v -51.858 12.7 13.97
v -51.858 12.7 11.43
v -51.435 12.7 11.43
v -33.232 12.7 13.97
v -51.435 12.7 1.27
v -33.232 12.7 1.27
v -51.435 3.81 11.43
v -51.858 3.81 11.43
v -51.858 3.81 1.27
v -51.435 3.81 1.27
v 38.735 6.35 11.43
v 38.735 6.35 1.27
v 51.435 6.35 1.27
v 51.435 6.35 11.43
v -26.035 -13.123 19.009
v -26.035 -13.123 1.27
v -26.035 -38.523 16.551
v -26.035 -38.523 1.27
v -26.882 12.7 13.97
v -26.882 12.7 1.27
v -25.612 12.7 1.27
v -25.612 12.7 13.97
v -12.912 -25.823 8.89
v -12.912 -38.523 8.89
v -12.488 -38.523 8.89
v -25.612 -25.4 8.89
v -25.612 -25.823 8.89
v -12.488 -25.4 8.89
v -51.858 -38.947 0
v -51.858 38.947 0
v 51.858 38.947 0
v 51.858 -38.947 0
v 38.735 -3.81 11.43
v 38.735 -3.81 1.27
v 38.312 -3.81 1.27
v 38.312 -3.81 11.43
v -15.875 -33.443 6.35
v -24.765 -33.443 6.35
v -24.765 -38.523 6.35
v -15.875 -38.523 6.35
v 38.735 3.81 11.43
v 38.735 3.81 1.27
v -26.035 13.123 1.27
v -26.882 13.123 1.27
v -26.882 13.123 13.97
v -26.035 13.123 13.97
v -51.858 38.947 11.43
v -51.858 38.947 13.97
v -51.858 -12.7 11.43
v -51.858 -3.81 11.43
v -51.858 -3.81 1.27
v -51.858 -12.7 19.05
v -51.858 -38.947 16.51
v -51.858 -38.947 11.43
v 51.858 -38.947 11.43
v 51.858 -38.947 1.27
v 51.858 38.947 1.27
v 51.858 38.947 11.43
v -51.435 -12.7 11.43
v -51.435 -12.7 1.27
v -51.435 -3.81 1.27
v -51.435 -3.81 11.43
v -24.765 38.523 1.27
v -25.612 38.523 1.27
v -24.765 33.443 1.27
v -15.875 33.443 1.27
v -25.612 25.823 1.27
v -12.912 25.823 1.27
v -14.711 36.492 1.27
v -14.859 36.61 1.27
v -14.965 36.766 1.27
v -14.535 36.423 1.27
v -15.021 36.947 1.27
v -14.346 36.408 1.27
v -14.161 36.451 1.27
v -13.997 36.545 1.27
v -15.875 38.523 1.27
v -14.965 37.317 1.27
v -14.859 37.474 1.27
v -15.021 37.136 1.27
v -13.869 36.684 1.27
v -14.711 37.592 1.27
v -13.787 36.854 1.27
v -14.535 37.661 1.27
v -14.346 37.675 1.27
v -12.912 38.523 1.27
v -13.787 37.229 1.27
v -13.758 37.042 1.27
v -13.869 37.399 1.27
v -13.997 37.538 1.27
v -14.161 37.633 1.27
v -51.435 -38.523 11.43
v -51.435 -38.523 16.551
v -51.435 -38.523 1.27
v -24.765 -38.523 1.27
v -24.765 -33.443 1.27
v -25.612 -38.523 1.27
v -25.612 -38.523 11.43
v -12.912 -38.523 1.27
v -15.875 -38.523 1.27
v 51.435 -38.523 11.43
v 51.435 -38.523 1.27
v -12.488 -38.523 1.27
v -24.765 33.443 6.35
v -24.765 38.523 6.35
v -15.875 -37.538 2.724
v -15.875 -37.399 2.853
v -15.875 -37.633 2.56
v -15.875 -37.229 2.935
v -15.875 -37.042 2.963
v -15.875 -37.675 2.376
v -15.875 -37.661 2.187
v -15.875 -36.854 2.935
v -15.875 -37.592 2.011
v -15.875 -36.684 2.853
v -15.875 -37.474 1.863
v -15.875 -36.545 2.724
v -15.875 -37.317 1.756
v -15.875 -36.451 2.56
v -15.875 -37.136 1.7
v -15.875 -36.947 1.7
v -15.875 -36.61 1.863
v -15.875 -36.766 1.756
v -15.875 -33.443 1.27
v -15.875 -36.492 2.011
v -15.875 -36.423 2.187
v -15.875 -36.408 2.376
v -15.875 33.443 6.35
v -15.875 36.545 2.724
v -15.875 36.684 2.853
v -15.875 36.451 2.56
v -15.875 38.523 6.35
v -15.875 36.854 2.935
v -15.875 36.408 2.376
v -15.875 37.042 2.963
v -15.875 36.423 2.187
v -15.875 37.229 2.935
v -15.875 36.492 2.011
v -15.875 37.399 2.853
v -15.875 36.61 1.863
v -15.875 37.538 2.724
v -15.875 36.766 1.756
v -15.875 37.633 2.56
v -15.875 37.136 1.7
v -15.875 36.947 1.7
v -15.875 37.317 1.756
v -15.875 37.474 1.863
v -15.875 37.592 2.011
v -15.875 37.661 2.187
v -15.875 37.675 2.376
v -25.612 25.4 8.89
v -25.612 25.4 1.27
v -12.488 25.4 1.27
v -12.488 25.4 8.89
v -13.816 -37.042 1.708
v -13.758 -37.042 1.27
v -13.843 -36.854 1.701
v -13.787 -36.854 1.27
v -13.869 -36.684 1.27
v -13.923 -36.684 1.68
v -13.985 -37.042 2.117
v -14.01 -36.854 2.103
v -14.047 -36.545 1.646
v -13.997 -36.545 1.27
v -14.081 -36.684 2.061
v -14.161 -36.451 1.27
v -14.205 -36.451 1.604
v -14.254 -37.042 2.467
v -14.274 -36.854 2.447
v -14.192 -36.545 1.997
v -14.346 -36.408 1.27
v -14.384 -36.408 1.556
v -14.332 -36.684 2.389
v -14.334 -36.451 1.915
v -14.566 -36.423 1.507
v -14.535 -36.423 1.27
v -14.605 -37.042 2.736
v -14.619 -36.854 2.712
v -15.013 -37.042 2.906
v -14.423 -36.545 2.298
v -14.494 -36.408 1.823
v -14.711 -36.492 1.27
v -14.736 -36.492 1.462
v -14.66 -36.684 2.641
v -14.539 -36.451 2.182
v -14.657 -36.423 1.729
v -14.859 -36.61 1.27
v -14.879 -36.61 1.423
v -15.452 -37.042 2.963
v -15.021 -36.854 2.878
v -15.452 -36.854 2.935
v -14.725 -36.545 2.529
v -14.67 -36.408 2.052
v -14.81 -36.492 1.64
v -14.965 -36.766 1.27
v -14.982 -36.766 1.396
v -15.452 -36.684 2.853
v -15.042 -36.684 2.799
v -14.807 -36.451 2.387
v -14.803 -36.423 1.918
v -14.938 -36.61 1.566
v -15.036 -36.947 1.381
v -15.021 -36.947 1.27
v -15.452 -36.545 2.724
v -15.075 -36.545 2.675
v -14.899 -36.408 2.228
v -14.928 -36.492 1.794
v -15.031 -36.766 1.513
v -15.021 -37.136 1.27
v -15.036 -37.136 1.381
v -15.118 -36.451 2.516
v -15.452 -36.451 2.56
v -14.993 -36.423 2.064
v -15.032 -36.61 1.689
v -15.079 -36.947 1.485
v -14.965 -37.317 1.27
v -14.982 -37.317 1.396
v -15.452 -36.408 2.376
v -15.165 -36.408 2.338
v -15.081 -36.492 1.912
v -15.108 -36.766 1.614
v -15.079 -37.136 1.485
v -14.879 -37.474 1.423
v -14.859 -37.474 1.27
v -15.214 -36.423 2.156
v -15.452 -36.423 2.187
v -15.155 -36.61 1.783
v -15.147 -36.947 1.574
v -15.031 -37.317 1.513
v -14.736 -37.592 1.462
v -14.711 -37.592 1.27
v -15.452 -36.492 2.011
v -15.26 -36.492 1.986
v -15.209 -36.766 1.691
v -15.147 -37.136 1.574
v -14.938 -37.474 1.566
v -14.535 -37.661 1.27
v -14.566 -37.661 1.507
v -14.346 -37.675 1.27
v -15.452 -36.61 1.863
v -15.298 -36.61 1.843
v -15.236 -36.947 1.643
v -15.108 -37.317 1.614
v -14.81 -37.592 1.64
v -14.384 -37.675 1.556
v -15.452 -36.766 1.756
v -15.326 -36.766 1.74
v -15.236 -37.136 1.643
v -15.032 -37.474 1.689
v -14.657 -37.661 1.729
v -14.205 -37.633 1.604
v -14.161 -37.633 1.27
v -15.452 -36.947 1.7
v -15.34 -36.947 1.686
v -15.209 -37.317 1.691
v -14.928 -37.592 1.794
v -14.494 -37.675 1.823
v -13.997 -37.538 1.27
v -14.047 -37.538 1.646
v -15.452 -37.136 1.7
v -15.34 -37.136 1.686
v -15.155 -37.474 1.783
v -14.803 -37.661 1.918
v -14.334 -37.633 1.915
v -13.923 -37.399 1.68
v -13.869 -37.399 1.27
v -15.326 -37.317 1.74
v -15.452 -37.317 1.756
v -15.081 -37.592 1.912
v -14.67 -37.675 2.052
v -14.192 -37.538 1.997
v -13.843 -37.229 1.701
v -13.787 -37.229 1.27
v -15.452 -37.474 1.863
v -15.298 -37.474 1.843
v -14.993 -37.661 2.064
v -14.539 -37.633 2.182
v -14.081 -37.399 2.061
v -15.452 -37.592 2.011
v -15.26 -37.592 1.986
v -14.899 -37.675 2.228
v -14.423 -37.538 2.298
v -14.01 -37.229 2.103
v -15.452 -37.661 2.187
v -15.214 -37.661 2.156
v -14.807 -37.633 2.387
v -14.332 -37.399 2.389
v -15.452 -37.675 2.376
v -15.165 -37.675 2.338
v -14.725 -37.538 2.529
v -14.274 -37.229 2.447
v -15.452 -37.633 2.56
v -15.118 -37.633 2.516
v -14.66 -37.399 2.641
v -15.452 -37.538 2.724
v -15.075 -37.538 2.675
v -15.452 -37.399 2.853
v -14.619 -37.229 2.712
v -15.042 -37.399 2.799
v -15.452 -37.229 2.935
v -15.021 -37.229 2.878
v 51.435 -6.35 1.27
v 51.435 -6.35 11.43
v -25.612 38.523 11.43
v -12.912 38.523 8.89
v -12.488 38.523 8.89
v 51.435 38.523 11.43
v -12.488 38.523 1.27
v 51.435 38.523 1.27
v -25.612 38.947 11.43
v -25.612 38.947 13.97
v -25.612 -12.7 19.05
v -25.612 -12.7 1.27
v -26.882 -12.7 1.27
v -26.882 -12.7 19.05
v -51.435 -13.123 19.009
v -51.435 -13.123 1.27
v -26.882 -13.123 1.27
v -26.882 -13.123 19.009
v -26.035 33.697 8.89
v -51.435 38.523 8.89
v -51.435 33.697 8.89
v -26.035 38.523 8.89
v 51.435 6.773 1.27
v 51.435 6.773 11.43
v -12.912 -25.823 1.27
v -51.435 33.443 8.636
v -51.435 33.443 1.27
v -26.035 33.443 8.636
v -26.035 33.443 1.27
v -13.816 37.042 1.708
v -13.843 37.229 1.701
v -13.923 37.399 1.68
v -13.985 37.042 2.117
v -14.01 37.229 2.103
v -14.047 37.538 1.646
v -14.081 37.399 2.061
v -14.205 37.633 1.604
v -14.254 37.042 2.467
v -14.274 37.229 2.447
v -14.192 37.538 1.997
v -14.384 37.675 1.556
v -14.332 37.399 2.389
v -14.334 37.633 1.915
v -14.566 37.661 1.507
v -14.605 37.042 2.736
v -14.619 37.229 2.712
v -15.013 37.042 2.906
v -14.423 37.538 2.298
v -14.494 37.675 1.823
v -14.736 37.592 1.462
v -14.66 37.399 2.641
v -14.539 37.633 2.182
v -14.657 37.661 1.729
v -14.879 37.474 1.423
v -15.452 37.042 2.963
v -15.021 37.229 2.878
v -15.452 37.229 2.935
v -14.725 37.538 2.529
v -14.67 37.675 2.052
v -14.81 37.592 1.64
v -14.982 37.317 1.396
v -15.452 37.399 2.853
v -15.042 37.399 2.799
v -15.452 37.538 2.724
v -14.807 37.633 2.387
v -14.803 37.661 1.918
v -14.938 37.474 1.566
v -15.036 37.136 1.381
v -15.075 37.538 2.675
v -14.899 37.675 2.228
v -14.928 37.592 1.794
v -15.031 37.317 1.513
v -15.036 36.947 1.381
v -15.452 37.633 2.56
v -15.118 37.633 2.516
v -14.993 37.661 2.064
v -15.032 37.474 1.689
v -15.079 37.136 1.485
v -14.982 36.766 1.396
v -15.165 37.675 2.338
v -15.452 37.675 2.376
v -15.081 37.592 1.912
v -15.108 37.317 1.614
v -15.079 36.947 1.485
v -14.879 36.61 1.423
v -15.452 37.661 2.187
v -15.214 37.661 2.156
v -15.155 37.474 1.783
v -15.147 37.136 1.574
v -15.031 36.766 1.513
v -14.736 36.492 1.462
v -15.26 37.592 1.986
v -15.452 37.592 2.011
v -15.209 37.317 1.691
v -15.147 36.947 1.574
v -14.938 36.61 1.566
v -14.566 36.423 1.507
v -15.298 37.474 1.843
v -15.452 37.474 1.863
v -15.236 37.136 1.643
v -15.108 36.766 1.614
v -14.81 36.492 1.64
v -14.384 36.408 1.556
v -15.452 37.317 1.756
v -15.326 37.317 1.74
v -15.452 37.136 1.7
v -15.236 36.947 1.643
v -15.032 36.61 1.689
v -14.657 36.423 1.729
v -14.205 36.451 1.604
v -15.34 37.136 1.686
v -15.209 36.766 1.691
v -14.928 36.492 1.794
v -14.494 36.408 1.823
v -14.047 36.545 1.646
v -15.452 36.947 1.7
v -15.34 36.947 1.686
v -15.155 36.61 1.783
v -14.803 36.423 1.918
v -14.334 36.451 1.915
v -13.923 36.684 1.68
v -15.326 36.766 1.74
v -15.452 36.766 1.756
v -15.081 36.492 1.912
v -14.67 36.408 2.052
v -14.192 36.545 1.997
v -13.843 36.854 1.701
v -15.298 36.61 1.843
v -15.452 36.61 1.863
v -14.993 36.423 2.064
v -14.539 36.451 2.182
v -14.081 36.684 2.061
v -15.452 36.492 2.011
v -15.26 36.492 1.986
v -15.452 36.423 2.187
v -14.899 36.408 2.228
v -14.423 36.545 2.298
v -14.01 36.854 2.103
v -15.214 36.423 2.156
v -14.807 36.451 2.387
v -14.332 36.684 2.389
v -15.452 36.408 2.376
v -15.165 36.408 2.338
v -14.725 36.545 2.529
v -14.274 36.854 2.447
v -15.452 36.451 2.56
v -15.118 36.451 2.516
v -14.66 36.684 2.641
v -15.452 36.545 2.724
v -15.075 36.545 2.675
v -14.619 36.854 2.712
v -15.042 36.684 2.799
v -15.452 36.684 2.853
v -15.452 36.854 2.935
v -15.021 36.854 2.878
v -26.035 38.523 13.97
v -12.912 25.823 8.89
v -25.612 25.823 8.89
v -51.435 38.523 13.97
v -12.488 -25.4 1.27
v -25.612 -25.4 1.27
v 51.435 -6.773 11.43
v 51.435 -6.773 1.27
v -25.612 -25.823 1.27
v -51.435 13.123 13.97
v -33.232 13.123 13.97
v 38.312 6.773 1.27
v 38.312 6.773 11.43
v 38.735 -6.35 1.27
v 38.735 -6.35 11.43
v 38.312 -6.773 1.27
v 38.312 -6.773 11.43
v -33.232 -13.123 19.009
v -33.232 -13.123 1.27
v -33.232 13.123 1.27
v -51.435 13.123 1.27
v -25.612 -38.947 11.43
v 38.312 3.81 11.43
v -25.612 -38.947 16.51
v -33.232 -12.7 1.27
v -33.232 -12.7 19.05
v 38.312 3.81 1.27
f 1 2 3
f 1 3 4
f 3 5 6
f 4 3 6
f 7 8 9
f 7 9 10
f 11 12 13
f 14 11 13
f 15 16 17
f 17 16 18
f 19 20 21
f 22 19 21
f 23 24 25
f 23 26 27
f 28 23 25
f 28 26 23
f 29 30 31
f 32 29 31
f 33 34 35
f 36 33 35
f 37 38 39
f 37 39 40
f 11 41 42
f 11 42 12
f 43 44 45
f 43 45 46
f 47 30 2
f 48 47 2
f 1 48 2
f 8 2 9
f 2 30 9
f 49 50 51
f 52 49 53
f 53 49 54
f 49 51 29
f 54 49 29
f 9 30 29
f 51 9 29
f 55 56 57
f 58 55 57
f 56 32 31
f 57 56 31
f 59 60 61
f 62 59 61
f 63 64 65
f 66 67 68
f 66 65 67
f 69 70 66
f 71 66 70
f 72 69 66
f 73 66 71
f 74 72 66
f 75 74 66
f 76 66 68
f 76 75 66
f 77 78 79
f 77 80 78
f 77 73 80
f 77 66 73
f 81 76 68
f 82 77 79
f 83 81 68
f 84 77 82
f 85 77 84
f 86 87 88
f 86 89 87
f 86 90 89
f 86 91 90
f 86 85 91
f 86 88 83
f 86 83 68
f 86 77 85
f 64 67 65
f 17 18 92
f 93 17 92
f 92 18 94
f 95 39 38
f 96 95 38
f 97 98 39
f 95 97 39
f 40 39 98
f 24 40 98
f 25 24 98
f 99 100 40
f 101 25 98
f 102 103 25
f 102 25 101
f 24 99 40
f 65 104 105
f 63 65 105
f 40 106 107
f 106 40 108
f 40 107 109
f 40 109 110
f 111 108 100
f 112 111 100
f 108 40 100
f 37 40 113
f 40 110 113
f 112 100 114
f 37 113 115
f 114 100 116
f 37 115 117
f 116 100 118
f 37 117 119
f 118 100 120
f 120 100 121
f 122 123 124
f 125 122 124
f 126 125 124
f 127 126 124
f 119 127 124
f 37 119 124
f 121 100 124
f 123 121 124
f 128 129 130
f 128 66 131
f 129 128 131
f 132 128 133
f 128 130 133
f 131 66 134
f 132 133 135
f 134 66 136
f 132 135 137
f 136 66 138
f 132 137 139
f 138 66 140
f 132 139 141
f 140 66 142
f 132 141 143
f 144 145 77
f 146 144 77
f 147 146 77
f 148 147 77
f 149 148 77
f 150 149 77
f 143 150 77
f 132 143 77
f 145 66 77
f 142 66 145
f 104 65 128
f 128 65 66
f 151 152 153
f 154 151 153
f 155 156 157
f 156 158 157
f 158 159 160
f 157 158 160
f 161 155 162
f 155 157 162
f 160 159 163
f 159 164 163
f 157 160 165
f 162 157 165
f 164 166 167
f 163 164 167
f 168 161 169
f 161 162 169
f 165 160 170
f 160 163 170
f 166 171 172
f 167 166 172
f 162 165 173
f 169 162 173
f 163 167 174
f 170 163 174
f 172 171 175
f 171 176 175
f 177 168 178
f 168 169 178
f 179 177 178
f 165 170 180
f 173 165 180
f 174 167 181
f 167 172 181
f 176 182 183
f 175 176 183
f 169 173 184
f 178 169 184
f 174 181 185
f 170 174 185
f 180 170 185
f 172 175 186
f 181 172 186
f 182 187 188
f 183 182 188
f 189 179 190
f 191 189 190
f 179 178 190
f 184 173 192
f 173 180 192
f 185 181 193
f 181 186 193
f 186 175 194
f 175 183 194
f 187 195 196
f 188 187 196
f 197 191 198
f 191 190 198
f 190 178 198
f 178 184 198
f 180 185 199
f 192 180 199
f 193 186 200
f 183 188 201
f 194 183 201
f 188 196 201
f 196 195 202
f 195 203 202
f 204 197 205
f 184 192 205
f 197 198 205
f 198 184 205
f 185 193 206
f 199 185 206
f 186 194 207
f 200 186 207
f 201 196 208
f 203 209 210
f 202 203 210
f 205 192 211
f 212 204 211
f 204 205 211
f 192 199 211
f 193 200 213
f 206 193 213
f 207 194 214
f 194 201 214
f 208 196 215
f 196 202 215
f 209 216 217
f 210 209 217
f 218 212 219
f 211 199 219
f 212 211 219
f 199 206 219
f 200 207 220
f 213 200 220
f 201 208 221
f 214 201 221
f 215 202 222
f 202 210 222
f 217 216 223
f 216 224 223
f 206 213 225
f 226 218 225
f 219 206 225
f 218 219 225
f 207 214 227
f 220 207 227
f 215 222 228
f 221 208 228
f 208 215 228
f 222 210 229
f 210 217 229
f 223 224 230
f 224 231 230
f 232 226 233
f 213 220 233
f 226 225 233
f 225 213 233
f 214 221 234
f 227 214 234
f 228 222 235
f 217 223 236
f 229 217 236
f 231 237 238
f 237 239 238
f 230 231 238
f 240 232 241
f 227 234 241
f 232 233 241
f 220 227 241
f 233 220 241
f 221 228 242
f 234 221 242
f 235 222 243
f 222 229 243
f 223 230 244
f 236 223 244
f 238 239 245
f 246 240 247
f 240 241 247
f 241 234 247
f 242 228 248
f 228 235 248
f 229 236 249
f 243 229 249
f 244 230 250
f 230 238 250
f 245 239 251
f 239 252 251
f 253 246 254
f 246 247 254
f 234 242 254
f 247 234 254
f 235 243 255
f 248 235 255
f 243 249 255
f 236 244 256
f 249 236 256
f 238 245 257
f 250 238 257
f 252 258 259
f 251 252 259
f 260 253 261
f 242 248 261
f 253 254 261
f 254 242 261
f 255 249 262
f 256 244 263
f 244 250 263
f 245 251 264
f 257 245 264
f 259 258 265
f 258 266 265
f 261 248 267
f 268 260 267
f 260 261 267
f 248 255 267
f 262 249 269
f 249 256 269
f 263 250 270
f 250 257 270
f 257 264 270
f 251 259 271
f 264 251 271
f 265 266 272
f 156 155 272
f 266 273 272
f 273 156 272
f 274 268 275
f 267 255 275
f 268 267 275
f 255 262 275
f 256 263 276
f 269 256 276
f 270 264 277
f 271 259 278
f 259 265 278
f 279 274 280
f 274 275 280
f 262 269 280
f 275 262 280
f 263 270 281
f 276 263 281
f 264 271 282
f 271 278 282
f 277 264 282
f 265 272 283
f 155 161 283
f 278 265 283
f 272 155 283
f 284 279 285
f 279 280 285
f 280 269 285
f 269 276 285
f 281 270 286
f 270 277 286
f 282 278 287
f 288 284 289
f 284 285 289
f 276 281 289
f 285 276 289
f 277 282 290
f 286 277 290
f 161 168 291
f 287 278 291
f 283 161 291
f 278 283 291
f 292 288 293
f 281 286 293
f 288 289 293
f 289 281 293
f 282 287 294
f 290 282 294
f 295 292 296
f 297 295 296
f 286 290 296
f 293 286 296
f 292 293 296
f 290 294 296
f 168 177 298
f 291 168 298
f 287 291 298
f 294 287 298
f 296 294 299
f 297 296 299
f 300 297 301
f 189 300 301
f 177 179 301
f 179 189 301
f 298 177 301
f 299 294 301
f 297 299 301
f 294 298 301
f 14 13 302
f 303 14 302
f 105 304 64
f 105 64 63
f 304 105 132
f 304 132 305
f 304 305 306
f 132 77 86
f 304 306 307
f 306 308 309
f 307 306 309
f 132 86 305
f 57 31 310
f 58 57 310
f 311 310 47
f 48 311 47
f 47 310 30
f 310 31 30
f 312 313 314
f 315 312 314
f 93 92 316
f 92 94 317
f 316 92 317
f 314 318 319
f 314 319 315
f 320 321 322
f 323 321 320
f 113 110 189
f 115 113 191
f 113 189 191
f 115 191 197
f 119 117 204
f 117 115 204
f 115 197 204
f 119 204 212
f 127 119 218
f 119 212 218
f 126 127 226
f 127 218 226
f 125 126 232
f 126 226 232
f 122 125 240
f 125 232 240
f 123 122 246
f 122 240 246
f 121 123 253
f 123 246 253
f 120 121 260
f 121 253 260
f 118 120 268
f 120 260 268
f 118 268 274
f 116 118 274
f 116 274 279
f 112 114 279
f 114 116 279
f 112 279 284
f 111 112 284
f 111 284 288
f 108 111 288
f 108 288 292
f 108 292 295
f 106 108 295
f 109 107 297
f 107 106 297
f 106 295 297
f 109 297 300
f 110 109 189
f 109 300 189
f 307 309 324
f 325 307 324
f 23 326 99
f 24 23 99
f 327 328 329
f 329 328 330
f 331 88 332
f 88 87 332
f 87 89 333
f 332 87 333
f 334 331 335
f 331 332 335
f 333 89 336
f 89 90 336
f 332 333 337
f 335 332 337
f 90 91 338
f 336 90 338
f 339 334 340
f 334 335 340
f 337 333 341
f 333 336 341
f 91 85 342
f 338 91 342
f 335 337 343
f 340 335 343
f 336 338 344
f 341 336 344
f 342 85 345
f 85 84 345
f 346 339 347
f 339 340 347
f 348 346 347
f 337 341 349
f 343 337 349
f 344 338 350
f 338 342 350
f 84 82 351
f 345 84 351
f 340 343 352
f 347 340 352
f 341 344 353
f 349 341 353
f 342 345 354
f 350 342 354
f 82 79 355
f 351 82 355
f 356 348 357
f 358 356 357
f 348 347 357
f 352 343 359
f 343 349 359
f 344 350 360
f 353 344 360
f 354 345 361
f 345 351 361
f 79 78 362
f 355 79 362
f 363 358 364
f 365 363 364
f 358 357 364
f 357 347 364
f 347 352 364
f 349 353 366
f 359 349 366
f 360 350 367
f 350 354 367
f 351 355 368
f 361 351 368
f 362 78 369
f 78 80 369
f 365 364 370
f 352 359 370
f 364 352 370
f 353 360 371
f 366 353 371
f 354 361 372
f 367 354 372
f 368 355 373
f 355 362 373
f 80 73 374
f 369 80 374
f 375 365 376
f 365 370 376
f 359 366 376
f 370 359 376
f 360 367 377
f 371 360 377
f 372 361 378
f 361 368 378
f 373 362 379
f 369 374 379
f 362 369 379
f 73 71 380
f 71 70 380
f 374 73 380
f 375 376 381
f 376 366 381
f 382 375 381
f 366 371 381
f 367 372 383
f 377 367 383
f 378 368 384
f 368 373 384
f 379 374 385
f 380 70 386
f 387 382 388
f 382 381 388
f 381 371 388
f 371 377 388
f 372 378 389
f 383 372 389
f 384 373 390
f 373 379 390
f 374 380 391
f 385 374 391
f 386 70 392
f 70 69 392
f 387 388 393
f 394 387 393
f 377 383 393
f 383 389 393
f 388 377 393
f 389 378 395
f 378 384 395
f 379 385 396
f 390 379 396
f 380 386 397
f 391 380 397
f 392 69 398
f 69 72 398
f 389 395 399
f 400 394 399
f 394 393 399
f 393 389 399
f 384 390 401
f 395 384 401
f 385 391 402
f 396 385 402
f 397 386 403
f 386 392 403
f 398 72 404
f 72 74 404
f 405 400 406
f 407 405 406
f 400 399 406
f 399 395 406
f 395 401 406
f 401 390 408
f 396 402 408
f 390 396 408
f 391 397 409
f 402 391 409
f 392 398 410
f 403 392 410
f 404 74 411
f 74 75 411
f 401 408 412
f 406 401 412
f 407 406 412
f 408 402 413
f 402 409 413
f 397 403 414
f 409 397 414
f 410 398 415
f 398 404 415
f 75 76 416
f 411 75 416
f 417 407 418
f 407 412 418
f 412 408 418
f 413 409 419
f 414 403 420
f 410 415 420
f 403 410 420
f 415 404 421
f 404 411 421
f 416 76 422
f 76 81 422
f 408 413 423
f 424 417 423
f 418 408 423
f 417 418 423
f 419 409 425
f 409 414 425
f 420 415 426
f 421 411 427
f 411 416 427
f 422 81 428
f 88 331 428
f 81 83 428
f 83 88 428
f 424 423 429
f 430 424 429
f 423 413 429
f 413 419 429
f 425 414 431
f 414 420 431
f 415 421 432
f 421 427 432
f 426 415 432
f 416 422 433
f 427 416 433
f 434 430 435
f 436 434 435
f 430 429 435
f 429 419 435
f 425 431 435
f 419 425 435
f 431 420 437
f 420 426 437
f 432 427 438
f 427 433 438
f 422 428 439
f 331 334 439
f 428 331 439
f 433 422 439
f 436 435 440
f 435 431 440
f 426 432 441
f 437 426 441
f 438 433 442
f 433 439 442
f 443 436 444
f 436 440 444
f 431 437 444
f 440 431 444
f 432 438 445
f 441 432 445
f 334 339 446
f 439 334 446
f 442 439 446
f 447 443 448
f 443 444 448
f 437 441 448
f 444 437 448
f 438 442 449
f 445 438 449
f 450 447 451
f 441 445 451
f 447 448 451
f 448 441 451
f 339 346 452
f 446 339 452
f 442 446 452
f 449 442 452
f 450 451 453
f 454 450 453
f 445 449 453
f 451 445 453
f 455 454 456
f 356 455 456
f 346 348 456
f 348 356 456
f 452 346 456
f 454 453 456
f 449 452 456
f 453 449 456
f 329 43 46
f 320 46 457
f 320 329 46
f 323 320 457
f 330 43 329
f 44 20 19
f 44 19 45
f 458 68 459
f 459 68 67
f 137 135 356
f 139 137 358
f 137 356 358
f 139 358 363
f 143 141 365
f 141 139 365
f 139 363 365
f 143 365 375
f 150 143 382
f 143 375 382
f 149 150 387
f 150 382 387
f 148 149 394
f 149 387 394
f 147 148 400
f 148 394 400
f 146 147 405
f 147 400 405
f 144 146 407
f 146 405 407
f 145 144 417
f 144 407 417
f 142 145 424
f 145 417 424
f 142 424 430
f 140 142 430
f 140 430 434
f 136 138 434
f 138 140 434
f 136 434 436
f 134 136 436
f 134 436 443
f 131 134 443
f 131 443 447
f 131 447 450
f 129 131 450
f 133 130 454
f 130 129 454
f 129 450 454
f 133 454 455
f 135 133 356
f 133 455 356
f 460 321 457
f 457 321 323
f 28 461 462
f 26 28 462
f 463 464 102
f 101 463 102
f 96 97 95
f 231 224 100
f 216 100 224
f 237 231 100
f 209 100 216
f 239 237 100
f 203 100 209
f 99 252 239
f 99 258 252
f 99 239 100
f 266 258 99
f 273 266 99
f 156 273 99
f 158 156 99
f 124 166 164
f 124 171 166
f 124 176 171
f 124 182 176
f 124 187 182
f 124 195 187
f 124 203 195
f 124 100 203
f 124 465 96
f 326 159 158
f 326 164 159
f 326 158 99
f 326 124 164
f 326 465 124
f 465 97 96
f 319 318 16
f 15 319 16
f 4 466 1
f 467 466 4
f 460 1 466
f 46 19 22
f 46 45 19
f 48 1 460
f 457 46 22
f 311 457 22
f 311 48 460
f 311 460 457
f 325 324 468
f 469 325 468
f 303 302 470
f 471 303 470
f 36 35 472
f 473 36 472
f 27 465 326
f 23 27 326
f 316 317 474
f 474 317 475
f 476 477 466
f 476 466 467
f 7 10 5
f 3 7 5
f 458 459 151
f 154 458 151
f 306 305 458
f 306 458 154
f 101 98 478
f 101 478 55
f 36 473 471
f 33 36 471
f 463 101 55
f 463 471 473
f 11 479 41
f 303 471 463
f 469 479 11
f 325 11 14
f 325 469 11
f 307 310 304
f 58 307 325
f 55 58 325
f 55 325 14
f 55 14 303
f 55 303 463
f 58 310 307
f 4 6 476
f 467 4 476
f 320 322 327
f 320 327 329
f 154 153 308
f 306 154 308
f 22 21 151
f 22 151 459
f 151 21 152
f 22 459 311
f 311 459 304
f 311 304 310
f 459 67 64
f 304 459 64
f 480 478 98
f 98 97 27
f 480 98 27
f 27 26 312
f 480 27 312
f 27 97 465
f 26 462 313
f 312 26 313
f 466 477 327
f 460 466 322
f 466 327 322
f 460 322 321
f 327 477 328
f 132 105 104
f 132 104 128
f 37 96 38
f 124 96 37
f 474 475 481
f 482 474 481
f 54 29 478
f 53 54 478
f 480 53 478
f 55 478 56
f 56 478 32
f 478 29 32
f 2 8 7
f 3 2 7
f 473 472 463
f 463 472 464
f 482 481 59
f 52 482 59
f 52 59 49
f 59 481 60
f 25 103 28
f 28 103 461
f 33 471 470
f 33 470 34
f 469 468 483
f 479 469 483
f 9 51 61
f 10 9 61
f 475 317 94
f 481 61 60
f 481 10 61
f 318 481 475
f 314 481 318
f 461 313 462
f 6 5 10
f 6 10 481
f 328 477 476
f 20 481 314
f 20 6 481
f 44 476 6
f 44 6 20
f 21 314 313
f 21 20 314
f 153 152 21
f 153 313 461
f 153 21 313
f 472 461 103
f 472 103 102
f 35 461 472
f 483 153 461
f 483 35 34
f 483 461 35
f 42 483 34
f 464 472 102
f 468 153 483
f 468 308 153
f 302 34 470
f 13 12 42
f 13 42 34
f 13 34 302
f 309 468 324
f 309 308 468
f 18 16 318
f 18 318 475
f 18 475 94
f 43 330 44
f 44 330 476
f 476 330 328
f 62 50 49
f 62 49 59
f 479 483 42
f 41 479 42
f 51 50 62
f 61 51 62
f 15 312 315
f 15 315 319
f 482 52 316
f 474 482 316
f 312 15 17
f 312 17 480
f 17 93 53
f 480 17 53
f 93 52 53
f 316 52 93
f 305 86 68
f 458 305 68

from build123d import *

# Parameters (mm, degrees)
F0_W         = 103.7166666667
F0_H         = 77.8933333333
F1_DEPTH     = 1.27
F2_W         = 102.87
F2_H         = 0.4233333333
F2_W_2       = 0.4233333333
F3_DEPTH     = 10.16
F4_W         = 25.4
F4_H         = 25.4
F5_DEPTH     = 2.54
F6_W         = 25.4
F6_H         = 5.08
F7_DEPTH     = 7.62
F8_SIZE      = 0.254
F10_DEPTH    = 17.78
F12_DEPTH    = 7.62
F14_DEPTH    = 10.16
F15_T1_DEPTH = 162.7058608064
F16_W        = 11.0460426462
F16_H        = 7.62
F16_W_2      = 6.35
F16_H_2      = 7.8945169225
F16_H_3      = 7.643327117
F17_DEPTH    = 25.4
F19_DEPTH    = 7.62
F18_R        = 0.635
F20_ANGLE    = 90
F21_W        = 8.89
F21_H        = 5.08
F22_DEPTH    = 5.08
F23_DEPTH    = 2.54


# Not quite as in the source:
# - a fillet or chamfer that OpenCascade refuses, or shapes differently, is made with other operations: its cross-section is extruded or revolved along the edge and cut away or added


with BuildPart() as f1:
    # F0 (on Top) → F1 (new body)
    with BuildSketch(Plane.XY):
        Rectangle(F0_W, F0_H)
    extrude(amount=F1_DEPTH)

    # F2 (on face) → F3 (join)
    with BuildSketch(Plane.XY.offset(1.27)):
        Polygon((-25.6116666667, 38.5233333333), (-26.035, 38.5233333333), (-26.035, 13.1233333333), (-51.435, 13.1233333333), (-51.435, 12.7), (-25.6116666667, 12.7), align=None)
        Polygon((-51.435, 13.1233333333), (-51.435, 38.5233333333), (-26.035, 38.5233333333), (-25.6116666667, 38.5233333333), (38.6280342937, 38.5233333333), (51.435, 38.5233333333), (51.8583333333, 38.5233333333), (51.8583333333, 38.9466666667), (-51.8583333333, 38.9466666667), (-51.8583333333, -38.5233333333), (-51.435, -38.5233333333), (-51.435, -30.5099412799), (-51.435, 12.7), align=None)
        Polygon((51.8583333333, 38.5233333333), (51.435, 38.5233333333), (51.435, -38.5233333333), (51.435, -38.9466666667), (51.8583333333, -38.9466666667), align=None)
        with Locations((0, -38.735)):
            Rectangle(F2_W, F2_H)
        with Locations((-51.6466666667, -38.735)):
            Rectangle(F2_W_2, F2_H)
    extrude(amount=F3_DEPTH)

    # F4 (on face) → F5 (join)
    with BuildSketch(Plane.XY.offset(11.43)):
        Polygon((-25.6116666667, 12.7), (-25.6116666667, 38.5233333333), (-25.6116666667, 38.9466666667), (-51.8583333333, 38.9466666667), (-51.8583333333, 12.7), (-51.435, 12.7), align=None)
        with Locations((-38.735, 25.8233333333)):
            Rectangle(F4_W, F4_H, mode=Mode.SUBTRACT)
    extrude(amount=F5_DEPTH)

    # F6 (on face) → F7 (join)
    with BuildSketch(Plane.XY.offset(1.27)):
        with Locations((-38.735, 35.9833333333)):
            Rectangle(F6_W, F6_H)
    extrude(amount=F7_DEPTH)

    # F8
    f8_edges = [f1.edges().sort_by_distance(p)[0] for p in [
        (-38.735, 33.443333, 8.89),
    ]]
    chamfer(f8_edges, length=F8_SIZE)

    # F9 (on face) → F10 (join)
    with BuildSketch(Plane.XY.offset(1.27)):
        Polygon((-26.035, -13.1233333333), (-26.035, -38.5233333333), (-25.6116666667, -38.5233333333), (-25.6116666667, -12.7), (-51.435, -12.7), (-51.435, -13.1233333333), align=None)
    extrude(amount=F10_DEPTH)

    # F11 (on face) → F12 (join)
    with BuildSketch(Plane.XY.offset(11.43)):
        Polygon((-25.6116666667, -38.9466666667), (-25.6116666667, -38.5233333333), (-26.035, -38.5233333333), (-51.435, -38.5233333333), (-51.435, -13.1233333333), (-51.435, -12.7), (-51.8583333333, -12.7), (-51.8583333333, -38.9466666667), align=None)
    extrude(amount=F12_DEPTH)

    # F13 (on face) → F14 (join)
    with BuildSketch(Plane.XY.offset(1.27)):
        Polygon((51.435, -6.7733333333), (51.435, -6.35), (38.735, -6.35), (38.735, -3.81), (38.3116666667, -3.81), (38.3116666667, -6.7733333333), align=None)
        Polygon((38.735, 6.35), (51.435, 6.35), (51.435, 6.7733333333), (38.3116666667, 6.7733333333), (38.3116666667, 3.81), (38.735, 3.81), align=None)
    extrude(amount=F14_DEPTH)

    # F15: chamfer of 2.54 x 26.2466666667 on 1 edges, made by hand

    # F15_s2 → F15_t1 (cut)
    with BuildSketch(Plane.YZ.offset(-120.0879304032)):
        Polygon((-12.7, 19.05), (-38.9466666667, 16.51), (-38.9466666667, 19.05), align=None)
    extrude(amount=F15_T1_DEPTH, mode=Mode.SUBTRACT)

    # F16 (on face) → F17 (cut)
    with BuildSketch(Plane.XY.offset(1.27)):
        with Locations((-51.2559060007, 0)):
            Rectangle(F16_W, F16_H)
        with Locations((-30.0566666667, 11.1596328206)):
            Rectangle(F16_W_2, F16_H_2)
        with Locations((-30.0566666667, -12.5059764832)):
            Rectangle(F16_W_2, F16_H_3)
    extrude(amount=F17_DEPTH, mode=Mode.SUBTRACT)

    # F18 (on face) → F19 (join)
    with BuildSketch(Plane.XY.offset(1.27)):
        Polygon((-12.4883333333, 38.5233333333), (-12.9116666667, 38.5233333333), (-12.9116666667, 25.8233333333), (-25.6116666667, 25.8233333333), (-25.6116666667, 25.4), (-12.4883333333, 25.4), align=None)
        Polygon((-12.9116666667, -38.5233333333), (-12.4883333333, -38.5233333333), (-12.4883333333, -25.4), (-25.6116666667, -25.4), (-25.6116666667, -25.8233333333), (-12.9116666667, -25.8233333333), align=None)
    extrude(amount=F19_DEPTH)

    # F18 (on face) → F20 (revolve)
    with BuildSketch(Plane.XY.offset(1.27)):
        with Locations((-14.3933333333, 37.0416666667)):
            Circle(F18_R)
        with Locations((-14.3933333333, -37.0416666667)):
            Circle(F18_R)
    revolve(axis=Axis((-15.4516666667, 37.5929450293, 1.27), (0, -1, 0)), revolution_arc=F20_ANGLE)

    # F21 (on face) → F22 (join)
    with BuildSketch(Plane.XY.offset(1.27)):
        with Locations((-20.32, 35.9833333333)):
            Rectangle(F21_W, F21_H)
        with Locations((-20.32, -35.9833333333)):
            Rectangle(F21_W, F21_H)
    extrude(amount=F22_DEPTH)

    # F23 (add): faces of the model
    f23_faces = [f1.faces().sort_by_distance(p)[0] for p in [
        (-15.4516666667, 37.0416666667, 2.3283333333),
        (-15.4516666667, -37.0416666667, 2.3283333333),
    ]]
    extrude(f23_faces, amount=F23_DEPTH)


solid = f1.part
